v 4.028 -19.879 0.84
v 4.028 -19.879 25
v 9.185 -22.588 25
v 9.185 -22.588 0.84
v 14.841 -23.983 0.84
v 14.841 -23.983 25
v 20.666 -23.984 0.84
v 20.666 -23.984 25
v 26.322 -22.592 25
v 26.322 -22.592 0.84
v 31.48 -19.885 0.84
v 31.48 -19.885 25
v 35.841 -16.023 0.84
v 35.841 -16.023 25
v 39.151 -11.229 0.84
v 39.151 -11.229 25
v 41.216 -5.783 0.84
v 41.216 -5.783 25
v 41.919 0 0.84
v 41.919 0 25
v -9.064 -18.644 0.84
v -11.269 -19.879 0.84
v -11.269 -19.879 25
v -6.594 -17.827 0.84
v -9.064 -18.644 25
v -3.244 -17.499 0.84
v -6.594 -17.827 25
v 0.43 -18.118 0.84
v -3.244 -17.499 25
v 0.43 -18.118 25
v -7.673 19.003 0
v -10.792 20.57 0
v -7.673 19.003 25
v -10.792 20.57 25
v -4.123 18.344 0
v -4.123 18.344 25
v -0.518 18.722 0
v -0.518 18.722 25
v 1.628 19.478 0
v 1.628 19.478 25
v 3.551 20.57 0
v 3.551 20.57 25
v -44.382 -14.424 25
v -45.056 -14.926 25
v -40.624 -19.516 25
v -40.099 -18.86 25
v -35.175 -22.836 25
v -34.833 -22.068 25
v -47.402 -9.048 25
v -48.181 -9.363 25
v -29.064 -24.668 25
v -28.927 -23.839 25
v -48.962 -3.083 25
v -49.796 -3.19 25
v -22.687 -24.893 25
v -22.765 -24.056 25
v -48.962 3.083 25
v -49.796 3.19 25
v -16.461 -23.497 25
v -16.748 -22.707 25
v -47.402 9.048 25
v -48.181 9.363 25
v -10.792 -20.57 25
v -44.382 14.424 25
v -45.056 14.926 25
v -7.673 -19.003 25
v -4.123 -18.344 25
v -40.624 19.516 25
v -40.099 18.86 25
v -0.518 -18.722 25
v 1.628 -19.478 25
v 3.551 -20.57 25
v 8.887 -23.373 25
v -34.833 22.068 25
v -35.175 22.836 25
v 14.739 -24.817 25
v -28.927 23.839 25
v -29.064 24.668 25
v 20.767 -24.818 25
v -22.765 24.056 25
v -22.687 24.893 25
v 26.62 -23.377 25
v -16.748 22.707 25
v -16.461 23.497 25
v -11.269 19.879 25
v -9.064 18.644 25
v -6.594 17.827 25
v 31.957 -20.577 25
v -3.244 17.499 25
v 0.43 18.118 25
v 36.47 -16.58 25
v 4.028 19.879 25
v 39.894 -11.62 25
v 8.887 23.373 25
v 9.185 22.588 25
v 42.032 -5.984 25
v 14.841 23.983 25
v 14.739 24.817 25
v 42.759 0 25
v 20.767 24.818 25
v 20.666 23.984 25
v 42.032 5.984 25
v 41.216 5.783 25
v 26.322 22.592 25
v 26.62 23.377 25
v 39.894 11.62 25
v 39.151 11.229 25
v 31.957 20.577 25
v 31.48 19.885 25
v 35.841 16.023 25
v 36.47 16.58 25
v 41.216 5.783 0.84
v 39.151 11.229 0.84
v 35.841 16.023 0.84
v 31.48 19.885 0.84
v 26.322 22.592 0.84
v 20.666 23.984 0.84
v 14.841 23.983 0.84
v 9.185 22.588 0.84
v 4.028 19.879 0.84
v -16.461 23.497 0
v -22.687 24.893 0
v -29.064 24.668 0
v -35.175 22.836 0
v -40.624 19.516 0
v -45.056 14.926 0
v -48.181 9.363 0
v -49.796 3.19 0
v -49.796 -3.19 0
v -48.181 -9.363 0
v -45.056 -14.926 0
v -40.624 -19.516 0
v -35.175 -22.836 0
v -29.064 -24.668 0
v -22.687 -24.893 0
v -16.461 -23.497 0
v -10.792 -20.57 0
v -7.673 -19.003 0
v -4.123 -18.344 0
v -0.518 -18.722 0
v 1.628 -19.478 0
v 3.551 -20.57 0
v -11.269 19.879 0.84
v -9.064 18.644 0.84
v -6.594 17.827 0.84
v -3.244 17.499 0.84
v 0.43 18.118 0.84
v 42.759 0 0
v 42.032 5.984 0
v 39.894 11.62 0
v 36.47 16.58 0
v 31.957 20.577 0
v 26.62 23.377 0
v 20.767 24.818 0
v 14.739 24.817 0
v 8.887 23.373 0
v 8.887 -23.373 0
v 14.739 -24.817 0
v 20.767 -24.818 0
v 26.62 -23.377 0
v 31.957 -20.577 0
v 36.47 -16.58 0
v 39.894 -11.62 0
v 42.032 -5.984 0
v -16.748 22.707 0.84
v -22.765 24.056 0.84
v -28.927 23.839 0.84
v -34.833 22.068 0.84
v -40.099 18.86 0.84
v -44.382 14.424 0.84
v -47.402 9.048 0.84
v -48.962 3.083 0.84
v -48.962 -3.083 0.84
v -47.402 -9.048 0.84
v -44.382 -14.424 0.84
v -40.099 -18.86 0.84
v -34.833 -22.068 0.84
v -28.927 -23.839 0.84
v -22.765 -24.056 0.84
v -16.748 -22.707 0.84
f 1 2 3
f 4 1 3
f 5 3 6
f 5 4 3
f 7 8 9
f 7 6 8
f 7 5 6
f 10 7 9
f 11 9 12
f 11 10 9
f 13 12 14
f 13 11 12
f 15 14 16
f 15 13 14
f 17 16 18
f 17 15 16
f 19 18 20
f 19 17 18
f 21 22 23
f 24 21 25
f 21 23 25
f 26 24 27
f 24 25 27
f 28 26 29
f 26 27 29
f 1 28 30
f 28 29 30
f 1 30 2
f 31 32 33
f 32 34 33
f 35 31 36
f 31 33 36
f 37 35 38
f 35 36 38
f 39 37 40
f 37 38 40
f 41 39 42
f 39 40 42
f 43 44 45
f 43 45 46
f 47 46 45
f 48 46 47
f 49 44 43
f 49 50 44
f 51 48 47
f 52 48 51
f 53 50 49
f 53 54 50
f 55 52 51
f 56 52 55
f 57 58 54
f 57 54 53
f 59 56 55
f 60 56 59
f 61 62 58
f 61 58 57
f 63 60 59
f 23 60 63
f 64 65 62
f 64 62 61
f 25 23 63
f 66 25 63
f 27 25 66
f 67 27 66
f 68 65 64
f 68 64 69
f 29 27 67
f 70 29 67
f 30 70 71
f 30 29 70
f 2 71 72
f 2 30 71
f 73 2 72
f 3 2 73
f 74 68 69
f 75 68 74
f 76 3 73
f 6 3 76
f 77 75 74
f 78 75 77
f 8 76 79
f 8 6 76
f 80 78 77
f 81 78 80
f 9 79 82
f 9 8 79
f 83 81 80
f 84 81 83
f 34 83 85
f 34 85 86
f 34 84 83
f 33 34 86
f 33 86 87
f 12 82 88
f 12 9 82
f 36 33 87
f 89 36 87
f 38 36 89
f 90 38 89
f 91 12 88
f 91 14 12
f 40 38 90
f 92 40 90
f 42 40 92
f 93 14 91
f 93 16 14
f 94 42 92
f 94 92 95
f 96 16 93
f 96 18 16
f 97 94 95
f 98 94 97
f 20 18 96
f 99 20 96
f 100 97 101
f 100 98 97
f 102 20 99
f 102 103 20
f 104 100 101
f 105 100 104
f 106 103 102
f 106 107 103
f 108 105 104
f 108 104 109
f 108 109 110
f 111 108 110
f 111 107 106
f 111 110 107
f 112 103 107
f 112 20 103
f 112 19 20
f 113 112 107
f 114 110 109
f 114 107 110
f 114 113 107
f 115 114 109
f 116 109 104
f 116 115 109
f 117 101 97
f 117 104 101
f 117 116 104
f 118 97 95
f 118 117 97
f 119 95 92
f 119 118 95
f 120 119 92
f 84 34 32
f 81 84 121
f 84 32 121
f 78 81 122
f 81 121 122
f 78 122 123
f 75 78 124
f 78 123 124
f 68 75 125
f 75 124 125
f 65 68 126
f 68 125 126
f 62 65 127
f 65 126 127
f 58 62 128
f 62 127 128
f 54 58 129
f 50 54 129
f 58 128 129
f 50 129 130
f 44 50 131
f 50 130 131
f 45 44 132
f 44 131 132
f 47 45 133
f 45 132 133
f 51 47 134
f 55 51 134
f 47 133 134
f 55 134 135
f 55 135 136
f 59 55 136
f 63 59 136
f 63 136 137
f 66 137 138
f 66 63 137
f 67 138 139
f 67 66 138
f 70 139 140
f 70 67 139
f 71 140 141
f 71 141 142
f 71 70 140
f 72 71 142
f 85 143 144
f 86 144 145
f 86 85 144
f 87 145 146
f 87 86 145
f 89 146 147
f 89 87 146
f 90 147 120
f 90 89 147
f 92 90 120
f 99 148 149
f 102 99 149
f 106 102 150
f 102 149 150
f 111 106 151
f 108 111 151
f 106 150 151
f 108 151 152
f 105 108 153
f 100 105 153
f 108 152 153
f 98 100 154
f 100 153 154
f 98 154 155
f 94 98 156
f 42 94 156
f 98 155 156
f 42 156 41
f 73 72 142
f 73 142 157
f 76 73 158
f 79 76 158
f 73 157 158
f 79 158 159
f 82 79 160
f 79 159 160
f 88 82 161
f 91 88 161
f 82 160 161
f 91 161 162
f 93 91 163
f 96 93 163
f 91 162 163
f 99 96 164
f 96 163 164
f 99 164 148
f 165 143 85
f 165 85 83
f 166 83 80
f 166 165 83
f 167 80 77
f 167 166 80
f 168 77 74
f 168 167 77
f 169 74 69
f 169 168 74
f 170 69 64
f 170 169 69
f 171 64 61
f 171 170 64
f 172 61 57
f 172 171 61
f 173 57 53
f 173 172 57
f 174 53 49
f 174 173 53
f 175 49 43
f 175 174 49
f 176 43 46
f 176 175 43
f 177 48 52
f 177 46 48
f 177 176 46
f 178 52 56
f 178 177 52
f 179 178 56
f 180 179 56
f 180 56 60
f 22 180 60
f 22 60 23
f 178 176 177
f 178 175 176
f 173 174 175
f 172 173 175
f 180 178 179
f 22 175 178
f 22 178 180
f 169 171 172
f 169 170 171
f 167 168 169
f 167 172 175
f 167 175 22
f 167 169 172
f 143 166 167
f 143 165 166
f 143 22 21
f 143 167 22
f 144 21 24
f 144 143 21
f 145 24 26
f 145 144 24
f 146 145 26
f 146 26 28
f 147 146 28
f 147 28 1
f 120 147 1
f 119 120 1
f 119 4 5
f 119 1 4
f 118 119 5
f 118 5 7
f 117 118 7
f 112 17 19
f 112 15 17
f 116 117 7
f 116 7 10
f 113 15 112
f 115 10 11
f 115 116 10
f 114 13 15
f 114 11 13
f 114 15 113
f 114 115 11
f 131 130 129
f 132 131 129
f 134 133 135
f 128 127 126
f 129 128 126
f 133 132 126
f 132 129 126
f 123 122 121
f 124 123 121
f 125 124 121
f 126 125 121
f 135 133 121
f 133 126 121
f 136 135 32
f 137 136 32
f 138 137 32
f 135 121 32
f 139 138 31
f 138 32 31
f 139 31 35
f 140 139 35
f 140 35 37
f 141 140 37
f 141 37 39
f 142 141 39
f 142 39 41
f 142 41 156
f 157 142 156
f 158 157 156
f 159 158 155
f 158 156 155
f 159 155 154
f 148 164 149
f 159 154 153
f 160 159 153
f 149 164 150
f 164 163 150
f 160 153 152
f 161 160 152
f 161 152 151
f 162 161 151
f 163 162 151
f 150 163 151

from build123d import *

# Parameters (mm, degrees)
F1_DEPTH = 25
F2_R     = 12.6178924605
F3_T     = -0.84


with BuildPart() as f1:
    # F0 (on Top) → F1 (new body)
    with BuildSketch(Plane.XY):
        with BuildLine():
            ThreePointArc((-3.620624356, -12.9584835946), (-7.2412487119, 0), (-3.620624356, 12.9584835946))
            ThreePointArc((-3.620624356, 12.9584835946), (-50, 0), (-3.620624356, -12.9584835946))
        make_face()
        with BuildLine():
            ThreePointArc((-3.620624356, -12.9584835946), (-0.9221638109, -6.7273920987), (0, 0))
            ThreePointArc((0, 0), (-0.9221638109, 6.7273920987), (-3.620624356, 12.9584835946))
            ThreePointArc((-3.620624356, 12.9584835946), (-7.2412487119, 0), (-3.620624356, -12.9584835946))
        make_face()
        with BuildLine():
            ThreePointArc((-3.620624356, 12.9584835946), (-0.9221638109, 6.7273920987), (0, 0))
            ThreePointArc((0, 0), (-0.9221638109, -6.7273920987), (-3.620624356, -12.9584835946))
            ThreePointArc((-3.620624356, -12.9584835946), (24.4861433868, -24.0778361891), (42.7587512881, 0))
            ThreePointArc((42.7587512881, 0), (24.4861433868, 24.0778361891), (-3.620624356, 12.9584835946))
        make_face()
    extrude(amount=F1_DEPTH)

    # F2
    f2_edges = [f1.edges().sort_by_distance(p)[0] for p in [
        (-3.620624, 12.958484, 12.5),
        (-3.620624, -12.958484, 12.5),
    ]]
    fillet(f2_edges, radius=F2_R)

    # F3
    f3_openings = [f1.faces().sort_by_distance(p)[0] for p in [
        (-3.620624, 0, 25),
    ]]
    offset(amount=F3_T, openings=f3_openings, kind=Kind.INTERSECTION)


solid = f1.part
